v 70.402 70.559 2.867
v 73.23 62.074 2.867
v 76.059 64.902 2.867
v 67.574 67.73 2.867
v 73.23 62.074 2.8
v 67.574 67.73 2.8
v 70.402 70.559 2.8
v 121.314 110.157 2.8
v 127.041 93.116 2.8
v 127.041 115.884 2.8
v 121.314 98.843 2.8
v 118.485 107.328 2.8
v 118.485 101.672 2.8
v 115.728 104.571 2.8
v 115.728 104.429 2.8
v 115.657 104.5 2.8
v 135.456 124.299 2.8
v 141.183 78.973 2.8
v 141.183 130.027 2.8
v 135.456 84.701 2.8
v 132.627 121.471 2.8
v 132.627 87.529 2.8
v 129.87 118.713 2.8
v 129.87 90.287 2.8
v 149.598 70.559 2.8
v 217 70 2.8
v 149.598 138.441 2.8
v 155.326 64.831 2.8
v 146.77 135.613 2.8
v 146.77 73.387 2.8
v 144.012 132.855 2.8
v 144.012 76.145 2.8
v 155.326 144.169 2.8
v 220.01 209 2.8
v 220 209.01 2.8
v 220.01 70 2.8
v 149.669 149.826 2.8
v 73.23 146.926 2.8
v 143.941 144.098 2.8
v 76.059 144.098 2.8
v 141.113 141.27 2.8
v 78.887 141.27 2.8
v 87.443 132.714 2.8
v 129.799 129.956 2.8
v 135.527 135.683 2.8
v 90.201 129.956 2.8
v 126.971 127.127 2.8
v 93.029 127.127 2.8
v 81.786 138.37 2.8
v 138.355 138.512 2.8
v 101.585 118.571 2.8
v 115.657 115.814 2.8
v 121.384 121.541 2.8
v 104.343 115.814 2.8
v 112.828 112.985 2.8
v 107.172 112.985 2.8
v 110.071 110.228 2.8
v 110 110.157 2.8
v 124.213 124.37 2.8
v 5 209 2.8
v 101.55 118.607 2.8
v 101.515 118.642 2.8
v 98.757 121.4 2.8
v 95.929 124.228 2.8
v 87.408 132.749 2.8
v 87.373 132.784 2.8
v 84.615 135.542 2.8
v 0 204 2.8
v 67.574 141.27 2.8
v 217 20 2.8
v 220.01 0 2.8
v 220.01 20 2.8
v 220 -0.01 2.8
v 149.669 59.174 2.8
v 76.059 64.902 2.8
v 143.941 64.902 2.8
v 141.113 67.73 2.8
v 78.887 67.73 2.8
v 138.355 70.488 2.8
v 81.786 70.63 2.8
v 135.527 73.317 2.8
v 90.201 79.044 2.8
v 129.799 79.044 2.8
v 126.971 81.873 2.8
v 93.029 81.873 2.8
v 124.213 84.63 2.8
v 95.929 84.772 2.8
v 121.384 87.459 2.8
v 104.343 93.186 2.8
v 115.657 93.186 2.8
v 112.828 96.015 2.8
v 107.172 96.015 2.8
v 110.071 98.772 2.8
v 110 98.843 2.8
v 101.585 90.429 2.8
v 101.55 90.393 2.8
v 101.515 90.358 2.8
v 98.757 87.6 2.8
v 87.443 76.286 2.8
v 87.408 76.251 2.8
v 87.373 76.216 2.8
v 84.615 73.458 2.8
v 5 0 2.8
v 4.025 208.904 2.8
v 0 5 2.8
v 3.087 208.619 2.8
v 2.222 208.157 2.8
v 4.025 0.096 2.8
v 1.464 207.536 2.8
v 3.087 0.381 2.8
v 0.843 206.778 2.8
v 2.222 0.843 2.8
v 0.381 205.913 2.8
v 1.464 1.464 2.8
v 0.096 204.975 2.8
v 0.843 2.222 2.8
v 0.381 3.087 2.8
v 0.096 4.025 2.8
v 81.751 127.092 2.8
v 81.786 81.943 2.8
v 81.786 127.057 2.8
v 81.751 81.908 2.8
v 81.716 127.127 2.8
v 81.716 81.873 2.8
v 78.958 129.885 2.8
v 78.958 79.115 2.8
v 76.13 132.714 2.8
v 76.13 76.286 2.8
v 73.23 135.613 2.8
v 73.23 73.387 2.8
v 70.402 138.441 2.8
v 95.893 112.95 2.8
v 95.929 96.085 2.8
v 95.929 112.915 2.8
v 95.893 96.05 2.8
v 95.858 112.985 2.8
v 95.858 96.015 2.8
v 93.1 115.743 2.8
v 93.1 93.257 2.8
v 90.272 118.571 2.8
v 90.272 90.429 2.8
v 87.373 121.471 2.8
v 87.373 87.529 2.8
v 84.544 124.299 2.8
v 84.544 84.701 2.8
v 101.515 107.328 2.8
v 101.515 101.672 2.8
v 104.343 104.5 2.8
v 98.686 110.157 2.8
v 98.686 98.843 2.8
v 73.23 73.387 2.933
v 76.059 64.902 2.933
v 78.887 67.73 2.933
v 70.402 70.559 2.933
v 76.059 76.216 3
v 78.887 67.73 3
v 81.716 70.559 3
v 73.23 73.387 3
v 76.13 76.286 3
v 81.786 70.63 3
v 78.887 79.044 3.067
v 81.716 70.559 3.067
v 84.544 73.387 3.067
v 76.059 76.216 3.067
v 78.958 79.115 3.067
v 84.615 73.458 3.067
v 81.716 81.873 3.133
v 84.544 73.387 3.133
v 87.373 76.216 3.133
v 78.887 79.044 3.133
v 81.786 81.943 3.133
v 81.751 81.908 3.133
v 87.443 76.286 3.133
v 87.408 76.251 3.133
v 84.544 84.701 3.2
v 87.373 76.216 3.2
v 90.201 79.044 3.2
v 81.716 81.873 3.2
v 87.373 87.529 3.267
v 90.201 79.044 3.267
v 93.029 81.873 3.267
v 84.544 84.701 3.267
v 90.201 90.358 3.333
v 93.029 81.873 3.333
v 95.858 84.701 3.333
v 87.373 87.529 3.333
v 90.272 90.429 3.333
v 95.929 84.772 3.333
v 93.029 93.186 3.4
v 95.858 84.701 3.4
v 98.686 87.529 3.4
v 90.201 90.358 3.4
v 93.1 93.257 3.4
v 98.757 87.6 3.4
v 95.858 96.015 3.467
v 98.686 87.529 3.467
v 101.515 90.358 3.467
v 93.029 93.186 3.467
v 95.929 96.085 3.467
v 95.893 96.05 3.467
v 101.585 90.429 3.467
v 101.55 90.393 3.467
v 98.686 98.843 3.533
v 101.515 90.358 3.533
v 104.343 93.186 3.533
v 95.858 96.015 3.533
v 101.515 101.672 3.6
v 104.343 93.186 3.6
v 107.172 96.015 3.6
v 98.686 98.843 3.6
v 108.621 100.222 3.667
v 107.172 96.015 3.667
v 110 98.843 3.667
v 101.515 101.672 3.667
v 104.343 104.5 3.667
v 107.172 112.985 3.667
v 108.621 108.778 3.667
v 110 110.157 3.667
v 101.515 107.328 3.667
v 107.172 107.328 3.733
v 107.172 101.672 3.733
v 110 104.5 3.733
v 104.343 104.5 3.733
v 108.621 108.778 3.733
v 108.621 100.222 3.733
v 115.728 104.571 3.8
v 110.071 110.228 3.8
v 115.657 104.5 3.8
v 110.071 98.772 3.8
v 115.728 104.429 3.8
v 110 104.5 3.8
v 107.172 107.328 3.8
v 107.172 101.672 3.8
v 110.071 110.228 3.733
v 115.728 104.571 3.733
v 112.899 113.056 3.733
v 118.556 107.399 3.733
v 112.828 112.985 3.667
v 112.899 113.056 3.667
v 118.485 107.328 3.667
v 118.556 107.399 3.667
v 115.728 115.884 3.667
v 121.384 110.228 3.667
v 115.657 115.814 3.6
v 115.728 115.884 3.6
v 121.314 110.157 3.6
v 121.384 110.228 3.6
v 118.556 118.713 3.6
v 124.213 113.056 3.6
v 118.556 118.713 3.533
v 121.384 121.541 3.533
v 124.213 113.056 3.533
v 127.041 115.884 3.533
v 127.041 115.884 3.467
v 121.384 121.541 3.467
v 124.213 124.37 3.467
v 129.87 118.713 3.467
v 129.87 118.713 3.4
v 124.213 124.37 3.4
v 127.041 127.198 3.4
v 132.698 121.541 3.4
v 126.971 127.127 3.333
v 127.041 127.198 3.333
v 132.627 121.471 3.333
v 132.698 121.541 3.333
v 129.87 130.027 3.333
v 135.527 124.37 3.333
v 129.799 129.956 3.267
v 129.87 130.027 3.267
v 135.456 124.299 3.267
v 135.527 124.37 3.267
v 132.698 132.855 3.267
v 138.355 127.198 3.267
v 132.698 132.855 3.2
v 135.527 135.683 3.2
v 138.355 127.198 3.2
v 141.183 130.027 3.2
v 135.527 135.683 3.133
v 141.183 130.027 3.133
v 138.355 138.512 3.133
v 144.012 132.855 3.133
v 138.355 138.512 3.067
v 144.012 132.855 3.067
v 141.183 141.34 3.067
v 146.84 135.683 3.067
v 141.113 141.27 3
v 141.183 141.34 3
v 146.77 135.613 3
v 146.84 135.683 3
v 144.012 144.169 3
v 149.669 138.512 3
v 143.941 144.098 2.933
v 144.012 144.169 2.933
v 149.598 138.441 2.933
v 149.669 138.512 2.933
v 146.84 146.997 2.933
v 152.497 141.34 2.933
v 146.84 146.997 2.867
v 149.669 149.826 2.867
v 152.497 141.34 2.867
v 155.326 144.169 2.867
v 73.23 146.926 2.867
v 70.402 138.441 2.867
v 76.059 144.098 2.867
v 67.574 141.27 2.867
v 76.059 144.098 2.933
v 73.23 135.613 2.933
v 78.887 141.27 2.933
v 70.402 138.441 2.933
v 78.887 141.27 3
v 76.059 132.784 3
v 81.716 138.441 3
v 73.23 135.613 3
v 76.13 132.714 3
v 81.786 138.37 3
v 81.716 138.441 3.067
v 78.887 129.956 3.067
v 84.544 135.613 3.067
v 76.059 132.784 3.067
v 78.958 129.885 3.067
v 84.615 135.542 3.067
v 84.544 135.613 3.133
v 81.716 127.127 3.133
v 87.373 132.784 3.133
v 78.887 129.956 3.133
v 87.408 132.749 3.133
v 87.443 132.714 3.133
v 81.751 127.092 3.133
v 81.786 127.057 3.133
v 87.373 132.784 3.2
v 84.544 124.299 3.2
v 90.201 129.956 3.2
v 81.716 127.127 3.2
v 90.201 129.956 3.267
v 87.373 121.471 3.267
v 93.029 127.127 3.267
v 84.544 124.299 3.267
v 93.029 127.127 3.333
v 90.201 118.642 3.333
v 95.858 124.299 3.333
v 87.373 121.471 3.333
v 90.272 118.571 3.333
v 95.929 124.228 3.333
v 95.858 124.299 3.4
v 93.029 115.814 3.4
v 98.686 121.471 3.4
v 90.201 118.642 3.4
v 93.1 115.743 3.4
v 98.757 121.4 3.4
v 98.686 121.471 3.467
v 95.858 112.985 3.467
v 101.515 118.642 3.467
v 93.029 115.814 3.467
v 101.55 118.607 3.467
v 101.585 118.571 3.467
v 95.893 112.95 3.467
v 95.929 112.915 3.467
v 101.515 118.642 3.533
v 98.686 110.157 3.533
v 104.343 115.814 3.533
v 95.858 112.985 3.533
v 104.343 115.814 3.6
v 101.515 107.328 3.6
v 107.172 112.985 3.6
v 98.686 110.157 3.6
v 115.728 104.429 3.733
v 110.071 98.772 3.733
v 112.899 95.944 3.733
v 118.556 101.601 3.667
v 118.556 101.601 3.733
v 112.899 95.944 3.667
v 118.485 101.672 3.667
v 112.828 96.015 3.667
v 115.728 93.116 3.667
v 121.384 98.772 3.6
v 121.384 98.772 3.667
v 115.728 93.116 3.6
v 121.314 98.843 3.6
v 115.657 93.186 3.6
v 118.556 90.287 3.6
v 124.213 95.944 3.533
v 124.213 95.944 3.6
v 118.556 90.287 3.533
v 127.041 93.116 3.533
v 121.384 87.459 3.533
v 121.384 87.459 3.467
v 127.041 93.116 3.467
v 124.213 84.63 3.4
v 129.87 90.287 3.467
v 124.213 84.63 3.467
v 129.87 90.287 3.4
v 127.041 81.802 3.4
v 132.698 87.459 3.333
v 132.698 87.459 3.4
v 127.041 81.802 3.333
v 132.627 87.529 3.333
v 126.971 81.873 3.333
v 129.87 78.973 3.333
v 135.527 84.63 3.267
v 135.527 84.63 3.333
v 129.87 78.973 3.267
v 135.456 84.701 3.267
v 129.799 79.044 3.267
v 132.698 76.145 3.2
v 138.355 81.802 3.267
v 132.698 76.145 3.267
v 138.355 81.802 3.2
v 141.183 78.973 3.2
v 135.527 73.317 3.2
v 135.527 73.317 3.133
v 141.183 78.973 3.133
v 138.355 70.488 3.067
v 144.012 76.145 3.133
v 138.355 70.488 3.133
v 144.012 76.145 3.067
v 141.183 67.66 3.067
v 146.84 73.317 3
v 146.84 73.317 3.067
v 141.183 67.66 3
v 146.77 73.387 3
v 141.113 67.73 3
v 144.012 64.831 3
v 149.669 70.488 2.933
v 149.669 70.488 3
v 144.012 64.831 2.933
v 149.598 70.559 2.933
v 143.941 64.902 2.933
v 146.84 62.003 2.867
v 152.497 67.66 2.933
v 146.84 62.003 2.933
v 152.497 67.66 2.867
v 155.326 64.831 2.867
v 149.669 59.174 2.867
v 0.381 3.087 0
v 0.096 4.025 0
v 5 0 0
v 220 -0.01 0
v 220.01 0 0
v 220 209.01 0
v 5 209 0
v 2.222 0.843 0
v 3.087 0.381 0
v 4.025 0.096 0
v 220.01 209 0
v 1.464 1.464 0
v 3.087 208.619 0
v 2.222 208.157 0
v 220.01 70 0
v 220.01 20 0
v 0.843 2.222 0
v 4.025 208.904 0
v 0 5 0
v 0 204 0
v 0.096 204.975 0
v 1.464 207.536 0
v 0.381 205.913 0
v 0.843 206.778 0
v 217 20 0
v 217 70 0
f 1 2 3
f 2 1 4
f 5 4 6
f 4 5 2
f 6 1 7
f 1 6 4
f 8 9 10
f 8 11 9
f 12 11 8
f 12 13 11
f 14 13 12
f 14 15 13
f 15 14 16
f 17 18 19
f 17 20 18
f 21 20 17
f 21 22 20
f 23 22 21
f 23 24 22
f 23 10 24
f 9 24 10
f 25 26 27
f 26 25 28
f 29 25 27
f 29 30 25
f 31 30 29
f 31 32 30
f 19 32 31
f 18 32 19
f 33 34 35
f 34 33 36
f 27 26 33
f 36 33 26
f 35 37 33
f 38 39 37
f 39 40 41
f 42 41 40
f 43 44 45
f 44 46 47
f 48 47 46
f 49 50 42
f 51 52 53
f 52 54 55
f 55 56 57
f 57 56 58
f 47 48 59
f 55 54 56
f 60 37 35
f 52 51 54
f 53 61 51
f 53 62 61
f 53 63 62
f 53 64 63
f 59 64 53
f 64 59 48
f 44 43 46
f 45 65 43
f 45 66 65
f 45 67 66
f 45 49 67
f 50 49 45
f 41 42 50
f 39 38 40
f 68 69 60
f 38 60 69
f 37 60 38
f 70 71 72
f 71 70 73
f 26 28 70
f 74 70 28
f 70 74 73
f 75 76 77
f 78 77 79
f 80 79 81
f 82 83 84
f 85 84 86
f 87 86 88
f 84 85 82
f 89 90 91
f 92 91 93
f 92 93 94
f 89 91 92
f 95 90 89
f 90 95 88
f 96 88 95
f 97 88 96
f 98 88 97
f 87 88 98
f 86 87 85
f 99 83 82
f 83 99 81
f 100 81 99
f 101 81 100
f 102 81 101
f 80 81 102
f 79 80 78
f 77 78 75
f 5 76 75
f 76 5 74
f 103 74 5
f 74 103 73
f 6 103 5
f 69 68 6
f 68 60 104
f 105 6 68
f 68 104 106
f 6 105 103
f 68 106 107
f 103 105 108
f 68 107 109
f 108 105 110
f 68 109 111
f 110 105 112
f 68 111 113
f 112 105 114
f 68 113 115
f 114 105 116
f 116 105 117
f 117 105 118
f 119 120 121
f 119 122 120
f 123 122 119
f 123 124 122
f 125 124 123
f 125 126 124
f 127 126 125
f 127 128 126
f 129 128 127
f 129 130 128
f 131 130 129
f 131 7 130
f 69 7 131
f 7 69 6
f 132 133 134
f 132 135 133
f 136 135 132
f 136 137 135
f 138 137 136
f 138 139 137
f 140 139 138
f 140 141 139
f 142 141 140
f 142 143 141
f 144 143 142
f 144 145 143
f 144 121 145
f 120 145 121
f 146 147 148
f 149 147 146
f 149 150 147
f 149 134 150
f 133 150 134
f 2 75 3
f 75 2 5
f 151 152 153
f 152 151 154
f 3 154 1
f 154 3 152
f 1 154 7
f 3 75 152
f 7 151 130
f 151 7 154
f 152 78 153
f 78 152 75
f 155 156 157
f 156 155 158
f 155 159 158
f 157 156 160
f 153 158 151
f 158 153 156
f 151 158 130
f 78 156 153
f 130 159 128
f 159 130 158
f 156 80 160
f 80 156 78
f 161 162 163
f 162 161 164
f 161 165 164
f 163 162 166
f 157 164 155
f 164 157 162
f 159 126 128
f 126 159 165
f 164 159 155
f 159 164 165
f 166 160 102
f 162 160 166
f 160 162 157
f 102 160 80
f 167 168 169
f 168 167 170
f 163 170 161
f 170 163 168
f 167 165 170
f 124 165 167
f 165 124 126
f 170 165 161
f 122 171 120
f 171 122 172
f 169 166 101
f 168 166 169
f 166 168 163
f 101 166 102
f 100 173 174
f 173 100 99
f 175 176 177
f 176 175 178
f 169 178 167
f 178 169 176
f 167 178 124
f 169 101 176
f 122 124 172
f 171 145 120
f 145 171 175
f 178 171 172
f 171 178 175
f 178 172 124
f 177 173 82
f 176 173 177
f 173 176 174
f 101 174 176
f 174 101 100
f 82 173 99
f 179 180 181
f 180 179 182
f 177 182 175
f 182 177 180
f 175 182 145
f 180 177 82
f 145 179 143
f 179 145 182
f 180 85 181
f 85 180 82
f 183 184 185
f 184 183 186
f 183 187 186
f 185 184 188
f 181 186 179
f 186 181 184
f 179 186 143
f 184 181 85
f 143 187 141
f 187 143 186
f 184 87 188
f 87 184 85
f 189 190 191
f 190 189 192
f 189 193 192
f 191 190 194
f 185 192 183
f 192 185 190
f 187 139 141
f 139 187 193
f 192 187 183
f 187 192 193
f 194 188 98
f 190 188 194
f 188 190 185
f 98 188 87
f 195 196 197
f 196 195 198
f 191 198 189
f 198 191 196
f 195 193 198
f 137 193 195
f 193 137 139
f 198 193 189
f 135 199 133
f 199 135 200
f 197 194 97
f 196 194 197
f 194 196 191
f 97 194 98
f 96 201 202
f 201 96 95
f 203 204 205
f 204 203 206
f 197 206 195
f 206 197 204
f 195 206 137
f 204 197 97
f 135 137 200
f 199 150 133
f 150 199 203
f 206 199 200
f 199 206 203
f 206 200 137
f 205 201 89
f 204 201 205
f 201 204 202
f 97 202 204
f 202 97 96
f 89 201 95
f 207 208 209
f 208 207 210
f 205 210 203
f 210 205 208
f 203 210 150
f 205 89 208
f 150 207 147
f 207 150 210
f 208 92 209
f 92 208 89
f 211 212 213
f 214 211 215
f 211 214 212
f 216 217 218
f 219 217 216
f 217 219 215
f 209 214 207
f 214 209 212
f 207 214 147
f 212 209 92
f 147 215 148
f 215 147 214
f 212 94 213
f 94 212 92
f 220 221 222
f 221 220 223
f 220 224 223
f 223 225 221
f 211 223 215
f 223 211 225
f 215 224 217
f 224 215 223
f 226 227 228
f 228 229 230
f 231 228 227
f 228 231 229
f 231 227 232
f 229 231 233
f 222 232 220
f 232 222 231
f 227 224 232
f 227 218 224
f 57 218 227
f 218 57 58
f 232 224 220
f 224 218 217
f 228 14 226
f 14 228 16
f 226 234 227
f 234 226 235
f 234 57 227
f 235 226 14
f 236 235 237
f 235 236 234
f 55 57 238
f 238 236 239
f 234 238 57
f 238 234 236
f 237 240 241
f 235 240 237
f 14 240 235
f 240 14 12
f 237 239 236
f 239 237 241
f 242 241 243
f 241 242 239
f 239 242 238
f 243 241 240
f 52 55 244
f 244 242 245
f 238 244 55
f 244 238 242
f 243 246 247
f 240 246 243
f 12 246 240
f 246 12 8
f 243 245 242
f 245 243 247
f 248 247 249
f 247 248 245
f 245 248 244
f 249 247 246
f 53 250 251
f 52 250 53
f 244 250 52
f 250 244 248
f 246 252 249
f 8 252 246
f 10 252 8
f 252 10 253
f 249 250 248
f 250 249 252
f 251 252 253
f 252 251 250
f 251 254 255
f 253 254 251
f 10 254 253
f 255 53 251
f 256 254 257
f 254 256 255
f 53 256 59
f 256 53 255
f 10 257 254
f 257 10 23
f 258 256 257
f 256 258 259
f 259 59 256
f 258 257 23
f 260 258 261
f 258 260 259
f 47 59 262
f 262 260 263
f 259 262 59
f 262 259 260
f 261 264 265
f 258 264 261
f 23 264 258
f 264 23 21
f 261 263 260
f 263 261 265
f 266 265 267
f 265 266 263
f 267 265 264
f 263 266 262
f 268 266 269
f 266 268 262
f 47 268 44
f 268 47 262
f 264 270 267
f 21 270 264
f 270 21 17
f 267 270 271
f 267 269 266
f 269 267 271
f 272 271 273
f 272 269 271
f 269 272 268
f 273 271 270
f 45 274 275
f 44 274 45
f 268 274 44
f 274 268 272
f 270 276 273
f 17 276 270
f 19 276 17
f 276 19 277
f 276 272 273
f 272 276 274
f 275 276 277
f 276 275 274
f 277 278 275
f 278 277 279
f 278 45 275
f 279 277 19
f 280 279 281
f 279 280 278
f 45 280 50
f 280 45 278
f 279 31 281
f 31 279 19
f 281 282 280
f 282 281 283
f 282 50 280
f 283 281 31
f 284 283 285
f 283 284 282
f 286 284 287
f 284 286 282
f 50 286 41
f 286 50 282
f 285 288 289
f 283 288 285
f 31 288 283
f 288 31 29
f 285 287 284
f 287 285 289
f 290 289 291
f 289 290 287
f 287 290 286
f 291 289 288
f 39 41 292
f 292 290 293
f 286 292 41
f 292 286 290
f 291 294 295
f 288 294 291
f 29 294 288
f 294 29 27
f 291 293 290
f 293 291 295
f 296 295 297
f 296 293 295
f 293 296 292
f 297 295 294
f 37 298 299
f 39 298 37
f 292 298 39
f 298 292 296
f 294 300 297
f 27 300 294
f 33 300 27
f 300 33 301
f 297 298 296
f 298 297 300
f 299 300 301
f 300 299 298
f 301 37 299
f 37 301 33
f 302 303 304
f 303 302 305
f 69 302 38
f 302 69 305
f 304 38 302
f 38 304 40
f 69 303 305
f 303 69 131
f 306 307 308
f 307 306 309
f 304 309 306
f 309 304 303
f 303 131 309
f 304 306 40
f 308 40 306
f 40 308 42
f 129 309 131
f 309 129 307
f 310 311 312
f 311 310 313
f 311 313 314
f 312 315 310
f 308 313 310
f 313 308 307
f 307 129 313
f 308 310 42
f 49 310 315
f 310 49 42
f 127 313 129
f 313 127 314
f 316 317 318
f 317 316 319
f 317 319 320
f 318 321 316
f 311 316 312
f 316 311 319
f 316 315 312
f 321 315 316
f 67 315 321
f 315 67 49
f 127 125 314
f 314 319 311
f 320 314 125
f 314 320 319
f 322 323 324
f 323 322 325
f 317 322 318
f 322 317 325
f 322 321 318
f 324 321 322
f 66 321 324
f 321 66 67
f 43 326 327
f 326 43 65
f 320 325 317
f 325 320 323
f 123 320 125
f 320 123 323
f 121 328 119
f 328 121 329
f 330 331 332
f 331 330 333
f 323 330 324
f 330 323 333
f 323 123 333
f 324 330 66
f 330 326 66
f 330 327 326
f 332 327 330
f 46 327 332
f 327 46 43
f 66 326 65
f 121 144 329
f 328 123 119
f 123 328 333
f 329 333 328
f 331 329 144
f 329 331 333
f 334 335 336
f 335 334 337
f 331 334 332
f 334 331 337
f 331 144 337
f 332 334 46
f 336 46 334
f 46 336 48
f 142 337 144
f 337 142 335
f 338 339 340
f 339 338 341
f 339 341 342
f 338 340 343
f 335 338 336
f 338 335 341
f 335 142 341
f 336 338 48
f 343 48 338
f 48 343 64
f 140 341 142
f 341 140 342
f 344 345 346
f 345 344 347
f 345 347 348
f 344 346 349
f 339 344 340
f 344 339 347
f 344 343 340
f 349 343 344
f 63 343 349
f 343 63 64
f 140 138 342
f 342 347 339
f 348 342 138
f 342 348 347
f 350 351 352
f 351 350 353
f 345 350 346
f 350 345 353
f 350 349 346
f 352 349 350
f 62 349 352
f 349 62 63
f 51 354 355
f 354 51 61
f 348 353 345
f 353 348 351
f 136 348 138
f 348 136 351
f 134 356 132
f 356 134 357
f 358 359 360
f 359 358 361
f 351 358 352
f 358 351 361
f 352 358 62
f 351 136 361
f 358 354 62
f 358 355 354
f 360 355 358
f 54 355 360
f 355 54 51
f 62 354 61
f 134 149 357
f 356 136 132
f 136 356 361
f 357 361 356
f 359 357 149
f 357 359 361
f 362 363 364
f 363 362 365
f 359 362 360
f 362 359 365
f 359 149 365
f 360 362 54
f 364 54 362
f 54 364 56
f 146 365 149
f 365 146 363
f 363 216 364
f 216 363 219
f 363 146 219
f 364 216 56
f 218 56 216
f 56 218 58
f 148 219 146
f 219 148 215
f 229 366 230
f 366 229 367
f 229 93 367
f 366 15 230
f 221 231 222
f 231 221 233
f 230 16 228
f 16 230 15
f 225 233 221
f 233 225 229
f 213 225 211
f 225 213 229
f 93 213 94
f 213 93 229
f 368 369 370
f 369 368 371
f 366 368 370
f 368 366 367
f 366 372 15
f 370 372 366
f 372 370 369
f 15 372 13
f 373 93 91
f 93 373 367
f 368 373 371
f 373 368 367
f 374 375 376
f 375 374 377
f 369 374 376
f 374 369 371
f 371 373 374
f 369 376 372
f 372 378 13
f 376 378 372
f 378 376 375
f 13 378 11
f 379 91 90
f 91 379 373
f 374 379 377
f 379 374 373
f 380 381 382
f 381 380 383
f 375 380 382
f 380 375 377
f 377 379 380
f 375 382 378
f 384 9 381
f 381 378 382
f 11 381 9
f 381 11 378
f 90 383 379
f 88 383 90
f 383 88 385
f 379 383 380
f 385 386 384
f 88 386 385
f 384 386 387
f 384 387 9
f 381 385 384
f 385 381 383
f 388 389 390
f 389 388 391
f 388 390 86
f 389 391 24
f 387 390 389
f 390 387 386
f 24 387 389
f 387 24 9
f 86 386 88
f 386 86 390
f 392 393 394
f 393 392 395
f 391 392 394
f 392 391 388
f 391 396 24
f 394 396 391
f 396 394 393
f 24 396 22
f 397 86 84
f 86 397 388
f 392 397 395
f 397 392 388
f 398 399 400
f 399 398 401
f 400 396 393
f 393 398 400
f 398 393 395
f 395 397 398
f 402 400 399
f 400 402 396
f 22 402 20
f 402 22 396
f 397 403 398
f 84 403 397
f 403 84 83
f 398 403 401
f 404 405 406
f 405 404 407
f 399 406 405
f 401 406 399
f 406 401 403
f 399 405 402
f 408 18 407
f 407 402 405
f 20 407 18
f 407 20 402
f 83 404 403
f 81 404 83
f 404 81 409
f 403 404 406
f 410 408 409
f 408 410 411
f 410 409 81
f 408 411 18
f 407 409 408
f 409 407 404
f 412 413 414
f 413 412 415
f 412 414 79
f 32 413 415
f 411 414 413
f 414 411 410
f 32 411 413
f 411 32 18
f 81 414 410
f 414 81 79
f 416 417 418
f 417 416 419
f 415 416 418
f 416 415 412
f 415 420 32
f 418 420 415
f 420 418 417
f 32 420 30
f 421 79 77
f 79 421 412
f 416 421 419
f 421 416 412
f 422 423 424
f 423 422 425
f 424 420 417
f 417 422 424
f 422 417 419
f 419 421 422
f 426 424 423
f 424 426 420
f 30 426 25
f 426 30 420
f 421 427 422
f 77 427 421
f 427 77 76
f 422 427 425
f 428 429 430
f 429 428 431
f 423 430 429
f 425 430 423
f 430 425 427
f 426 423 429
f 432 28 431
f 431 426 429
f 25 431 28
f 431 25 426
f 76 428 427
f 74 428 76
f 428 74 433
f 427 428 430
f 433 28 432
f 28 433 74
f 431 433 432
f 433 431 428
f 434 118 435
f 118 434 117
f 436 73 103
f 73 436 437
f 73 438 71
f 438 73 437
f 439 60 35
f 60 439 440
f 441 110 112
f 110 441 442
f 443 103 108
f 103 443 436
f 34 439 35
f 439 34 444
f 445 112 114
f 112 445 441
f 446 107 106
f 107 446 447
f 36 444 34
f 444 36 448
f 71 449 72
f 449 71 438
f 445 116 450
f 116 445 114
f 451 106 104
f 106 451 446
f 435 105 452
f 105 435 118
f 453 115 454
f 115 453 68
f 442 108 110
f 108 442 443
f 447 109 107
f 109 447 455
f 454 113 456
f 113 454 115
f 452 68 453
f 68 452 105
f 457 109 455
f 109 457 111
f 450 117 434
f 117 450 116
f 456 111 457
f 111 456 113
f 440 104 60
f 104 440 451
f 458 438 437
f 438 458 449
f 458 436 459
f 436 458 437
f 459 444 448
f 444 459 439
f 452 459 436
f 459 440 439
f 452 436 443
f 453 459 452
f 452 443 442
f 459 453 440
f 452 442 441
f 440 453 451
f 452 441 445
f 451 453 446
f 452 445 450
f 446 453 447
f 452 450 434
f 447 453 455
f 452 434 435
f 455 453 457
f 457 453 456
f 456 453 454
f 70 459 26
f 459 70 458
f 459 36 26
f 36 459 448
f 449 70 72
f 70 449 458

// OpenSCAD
// 滑槽拼接 - 不同方向测试
// A部分：220mm × 209mm × 2.8mm

// 参数
width = 220;     // 宽度 (mm)
height = 209;    // 高度 (mm)
thickness = 2.8; // 厚度 (mm)
corner_radius = 5;  // 倒角半径 (mm)

// X 图案参数
x_max_height = 1.0;
x_width = 8;
x_diagonal = 120;

// 圆角矩形模块（右侧不倒角）
module rounded_rect_right_flat(w, h, r, t) {
    hull() {
        translate([r, r, 0]) cylinder(h = t, r = r, $fn = 32);
        translate([r, h - r, 0]) cylinder(h = t, r = r, $fn = 32);
        translate([w, h, 0]) cylinder(h = t, r = 0.01, $fn = 4);
        translate([w, 0, 0]) cylinder(h = t, r = 0.01, $fn = 4);
    }
}

// 滑槽方向1：上下方向
module slot_up_down() {
    color("Red")
    translate([width - 3, 20, -0.1])
    cube([3.2, 50, 3]);  // 深度3mm，高度50mm（从上往下）
}

// 滑槽方向2：前后方向
module slot_front_back() {
    color("Blue")
    translate([width - 3, 20, -0.1])
    cube([3.2, 3, 50]);  // 深度3mm，长度50mm（从前向后）
}

// 滑槽方向3：对角线方向
module slot_diagonal() {
    color("Green")
    translate([width - 3, 20, -0.1])
    rotate([0, 0, 45])
    cube([3.2, 40, 3]);  // 深度3mm，对角线40mm
}

// 创建主体 - 测试不同方向
difference() {
    union() {
        // 面板主体
        color("LightGray") {
            rounded_rect_right_flat(width, height, corner_radius, thickness);
        }

        // X 图案
        color("DarkGray") {
            translate([width/2, height/2, 0])
            x_pattern();
        }
    }

    // 测试：只显示一种方向的滑槽
    // 方向1：上下方向
    slot_up_down();
    
    // 方向2：前后方向（注释掉方向1测试方向2）
    // slot_front_back();
    
    // 方向3：对角线方向（注释掉其他测试）
    // slot_diagonal();
}

// X 图案模块
module x_pattern() {
    segments = 30;
    segment_length = x_diagonal / segments;

    union() {
        for (i = [-segments/2:segments/2-1]) {
            dist_ratio = abs(i) / (segments/2);
            current_height = x_max_height * (1 - dist_ratio);

            translate([0, 0, thickness])
            rotate([0, 0, 45])
            translate([i * segment_length, -x_width/2, 0])
            cube([segment_length + 0.1, x_width, current_height]);
        }

        for (i = [-segments/2:segments/2-1]) {
            dist_ratio = abs(i) / (segments/2);
            current_height = x_max_height * (1 - dist_ratio);

            translate([0, 0, thickness])
            rotate([0, 0, -45])
            translate([i * segment_length, -x_width/2, 0])
            cube([segment_length + 0.1, x_width, current_height]);
        }
    }
}
